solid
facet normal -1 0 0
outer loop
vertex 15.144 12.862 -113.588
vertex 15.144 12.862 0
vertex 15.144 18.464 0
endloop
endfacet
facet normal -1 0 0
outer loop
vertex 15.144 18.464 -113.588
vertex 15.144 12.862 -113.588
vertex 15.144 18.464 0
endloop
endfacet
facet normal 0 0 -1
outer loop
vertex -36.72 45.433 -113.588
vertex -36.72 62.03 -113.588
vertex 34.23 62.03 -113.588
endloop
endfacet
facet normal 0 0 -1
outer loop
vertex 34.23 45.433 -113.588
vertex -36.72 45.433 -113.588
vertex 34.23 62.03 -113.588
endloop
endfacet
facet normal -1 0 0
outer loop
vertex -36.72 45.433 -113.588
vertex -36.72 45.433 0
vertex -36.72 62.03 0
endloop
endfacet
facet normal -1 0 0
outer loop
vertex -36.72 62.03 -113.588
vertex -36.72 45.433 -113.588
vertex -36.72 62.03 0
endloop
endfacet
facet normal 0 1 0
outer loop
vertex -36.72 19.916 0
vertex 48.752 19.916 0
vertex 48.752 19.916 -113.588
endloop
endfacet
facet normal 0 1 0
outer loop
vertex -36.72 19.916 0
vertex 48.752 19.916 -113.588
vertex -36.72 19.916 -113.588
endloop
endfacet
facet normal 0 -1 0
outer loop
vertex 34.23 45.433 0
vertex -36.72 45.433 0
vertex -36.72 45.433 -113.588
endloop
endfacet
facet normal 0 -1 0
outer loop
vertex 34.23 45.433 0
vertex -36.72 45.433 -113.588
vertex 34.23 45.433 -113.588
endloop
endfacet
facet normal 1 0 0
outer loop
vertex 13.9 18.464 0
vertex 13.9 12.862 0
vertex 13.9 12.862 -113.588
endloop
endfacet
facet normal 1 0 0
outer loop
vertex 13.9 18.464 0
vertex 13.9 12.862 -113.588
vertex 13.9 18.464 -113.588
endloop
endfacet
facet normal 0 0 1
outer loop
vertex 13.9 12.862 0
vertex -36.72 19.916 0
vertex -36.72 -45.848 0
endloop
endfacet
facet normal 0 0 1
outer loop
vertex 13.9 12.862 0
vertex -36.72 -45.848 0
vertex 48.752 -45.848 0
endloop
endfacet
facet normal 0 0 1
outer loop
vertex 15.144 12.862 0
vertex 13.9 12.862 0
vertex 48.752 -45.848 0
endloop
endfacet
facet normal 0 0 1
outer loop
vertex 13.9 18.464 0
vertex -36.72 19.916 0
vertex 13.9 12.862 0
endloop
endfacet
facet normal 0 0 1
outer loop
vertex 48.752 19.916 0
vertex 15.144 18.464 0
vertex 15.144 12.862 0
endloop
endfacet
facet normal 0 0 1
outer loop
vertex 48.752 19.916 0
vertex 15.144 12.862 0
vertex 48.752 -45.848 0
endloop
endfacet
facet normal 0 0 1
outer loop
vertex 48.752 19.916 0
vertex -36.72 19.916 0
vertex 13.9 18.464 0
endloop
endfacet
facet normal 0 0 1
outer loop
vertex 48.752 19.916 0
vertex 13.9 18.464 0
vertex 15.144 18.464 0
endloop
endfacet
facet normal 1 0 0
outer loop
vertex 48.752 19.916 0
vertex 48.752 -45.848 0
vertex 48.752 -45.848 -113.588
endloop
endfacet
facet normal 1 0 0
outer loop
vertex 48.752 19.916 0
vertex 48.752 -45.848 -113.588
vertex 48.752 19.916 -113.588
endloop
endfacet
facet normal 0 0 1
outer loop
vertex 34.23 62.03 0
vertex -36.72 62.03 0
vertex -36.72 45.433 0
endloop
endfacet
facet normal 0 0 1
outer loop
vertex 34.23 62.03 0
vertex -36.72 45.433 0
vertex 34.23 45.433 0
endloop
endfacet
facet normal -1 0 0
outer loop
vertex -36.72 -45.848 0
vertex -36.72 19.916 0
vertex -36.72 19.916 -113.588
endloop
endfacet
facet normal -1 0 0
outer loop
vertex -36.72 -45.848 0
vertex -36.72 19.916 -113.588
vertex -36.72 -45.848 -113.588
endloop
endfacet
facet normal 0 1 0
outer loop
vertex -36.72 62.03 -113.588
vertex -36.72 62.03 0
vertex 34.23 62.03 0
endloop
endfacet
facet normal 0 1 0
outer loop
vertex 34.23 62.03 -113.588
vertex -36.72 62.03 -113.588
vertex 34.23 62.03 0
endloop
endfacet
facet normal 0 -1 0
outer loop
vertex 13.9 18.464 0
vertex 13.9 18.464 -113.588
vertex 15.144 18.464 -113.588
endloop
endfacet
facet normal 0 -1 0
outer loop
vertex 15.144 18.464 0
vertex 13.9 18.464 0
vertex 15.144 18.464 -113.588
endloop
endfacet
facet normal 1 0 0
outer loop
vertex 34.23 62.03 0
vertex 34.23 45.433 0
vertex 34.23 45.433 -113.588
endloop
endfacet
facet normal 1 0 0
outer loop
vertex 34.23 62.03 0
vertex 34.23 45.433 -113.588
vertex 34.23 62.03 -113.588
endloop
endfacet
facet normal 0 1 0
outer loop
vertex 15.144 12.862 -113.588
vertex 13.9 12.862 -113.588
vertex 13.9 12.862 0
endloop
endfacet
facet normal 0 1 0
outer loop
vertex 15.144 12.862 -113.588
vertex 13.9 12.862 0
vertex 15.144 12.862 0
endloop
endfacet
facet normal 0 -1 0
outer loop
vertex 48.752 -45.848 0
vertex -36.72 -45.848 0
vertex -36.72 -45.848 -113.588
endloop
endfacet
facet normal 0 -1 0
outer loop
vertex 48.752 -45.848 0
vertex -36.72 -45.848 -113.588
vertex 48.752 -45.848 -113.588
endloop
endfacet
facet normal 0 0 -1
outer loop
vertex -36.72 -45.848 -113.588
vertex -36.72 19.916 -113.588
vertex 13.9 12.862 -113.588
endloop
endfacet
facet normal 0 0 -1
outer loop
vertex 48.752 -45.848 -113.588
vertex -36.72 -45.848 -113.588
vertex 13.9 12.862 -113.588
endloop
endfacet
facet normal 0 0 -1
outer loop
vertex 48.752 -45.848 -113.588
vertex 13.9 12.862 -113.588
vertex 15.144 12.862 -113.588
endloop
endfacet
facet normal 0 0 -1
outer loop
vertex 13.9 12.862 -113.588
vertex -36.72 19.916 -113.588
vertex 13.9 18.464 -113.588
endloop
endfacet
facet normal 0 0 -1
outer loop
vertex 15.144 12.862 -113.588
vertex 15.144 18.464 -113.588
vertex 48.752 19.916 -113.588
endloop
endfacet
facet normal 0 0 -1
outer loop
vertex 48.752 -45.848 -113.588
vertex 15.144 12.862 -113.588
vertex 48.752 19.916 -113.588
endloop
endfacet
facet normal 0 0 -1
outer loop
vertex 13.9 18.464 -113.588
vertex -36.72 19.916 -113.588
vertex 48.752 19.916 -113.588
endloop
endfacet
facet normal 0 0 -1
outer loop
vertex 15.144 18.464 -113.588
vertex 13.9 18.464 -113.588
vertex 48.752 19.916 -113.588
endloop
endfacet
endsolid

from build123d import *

# Parameters (mm, degrees)
F0_W     = 1.244753
F0_H     = 5.601339
F0_W_2   = 70.950344
F0_H_2   = 16.596571
F1_DEPTH = 113.58846


with BuildPart() as f1:
    # F0 (on Top) → F1 (new body)
    with BuildSketch(Plane.XY):
        Polygon((48.752397, 19.915894), (-36.719948, 19.915894), (-36.719948, -45.848012), (48.752397, -45.848012), (48.752397, 0), align=None)
        with Locations((14.521971, 15.663024)):
            Rectangle(F0_W, F0_H, mode=Mode.SUBTRACT)
        with Locations((-1.244776, 53.731412)):
            Rectangle(F0_W_2, F0_H_2)
    extrude(amount=-F1_DEPTH)


solid = f1.part
